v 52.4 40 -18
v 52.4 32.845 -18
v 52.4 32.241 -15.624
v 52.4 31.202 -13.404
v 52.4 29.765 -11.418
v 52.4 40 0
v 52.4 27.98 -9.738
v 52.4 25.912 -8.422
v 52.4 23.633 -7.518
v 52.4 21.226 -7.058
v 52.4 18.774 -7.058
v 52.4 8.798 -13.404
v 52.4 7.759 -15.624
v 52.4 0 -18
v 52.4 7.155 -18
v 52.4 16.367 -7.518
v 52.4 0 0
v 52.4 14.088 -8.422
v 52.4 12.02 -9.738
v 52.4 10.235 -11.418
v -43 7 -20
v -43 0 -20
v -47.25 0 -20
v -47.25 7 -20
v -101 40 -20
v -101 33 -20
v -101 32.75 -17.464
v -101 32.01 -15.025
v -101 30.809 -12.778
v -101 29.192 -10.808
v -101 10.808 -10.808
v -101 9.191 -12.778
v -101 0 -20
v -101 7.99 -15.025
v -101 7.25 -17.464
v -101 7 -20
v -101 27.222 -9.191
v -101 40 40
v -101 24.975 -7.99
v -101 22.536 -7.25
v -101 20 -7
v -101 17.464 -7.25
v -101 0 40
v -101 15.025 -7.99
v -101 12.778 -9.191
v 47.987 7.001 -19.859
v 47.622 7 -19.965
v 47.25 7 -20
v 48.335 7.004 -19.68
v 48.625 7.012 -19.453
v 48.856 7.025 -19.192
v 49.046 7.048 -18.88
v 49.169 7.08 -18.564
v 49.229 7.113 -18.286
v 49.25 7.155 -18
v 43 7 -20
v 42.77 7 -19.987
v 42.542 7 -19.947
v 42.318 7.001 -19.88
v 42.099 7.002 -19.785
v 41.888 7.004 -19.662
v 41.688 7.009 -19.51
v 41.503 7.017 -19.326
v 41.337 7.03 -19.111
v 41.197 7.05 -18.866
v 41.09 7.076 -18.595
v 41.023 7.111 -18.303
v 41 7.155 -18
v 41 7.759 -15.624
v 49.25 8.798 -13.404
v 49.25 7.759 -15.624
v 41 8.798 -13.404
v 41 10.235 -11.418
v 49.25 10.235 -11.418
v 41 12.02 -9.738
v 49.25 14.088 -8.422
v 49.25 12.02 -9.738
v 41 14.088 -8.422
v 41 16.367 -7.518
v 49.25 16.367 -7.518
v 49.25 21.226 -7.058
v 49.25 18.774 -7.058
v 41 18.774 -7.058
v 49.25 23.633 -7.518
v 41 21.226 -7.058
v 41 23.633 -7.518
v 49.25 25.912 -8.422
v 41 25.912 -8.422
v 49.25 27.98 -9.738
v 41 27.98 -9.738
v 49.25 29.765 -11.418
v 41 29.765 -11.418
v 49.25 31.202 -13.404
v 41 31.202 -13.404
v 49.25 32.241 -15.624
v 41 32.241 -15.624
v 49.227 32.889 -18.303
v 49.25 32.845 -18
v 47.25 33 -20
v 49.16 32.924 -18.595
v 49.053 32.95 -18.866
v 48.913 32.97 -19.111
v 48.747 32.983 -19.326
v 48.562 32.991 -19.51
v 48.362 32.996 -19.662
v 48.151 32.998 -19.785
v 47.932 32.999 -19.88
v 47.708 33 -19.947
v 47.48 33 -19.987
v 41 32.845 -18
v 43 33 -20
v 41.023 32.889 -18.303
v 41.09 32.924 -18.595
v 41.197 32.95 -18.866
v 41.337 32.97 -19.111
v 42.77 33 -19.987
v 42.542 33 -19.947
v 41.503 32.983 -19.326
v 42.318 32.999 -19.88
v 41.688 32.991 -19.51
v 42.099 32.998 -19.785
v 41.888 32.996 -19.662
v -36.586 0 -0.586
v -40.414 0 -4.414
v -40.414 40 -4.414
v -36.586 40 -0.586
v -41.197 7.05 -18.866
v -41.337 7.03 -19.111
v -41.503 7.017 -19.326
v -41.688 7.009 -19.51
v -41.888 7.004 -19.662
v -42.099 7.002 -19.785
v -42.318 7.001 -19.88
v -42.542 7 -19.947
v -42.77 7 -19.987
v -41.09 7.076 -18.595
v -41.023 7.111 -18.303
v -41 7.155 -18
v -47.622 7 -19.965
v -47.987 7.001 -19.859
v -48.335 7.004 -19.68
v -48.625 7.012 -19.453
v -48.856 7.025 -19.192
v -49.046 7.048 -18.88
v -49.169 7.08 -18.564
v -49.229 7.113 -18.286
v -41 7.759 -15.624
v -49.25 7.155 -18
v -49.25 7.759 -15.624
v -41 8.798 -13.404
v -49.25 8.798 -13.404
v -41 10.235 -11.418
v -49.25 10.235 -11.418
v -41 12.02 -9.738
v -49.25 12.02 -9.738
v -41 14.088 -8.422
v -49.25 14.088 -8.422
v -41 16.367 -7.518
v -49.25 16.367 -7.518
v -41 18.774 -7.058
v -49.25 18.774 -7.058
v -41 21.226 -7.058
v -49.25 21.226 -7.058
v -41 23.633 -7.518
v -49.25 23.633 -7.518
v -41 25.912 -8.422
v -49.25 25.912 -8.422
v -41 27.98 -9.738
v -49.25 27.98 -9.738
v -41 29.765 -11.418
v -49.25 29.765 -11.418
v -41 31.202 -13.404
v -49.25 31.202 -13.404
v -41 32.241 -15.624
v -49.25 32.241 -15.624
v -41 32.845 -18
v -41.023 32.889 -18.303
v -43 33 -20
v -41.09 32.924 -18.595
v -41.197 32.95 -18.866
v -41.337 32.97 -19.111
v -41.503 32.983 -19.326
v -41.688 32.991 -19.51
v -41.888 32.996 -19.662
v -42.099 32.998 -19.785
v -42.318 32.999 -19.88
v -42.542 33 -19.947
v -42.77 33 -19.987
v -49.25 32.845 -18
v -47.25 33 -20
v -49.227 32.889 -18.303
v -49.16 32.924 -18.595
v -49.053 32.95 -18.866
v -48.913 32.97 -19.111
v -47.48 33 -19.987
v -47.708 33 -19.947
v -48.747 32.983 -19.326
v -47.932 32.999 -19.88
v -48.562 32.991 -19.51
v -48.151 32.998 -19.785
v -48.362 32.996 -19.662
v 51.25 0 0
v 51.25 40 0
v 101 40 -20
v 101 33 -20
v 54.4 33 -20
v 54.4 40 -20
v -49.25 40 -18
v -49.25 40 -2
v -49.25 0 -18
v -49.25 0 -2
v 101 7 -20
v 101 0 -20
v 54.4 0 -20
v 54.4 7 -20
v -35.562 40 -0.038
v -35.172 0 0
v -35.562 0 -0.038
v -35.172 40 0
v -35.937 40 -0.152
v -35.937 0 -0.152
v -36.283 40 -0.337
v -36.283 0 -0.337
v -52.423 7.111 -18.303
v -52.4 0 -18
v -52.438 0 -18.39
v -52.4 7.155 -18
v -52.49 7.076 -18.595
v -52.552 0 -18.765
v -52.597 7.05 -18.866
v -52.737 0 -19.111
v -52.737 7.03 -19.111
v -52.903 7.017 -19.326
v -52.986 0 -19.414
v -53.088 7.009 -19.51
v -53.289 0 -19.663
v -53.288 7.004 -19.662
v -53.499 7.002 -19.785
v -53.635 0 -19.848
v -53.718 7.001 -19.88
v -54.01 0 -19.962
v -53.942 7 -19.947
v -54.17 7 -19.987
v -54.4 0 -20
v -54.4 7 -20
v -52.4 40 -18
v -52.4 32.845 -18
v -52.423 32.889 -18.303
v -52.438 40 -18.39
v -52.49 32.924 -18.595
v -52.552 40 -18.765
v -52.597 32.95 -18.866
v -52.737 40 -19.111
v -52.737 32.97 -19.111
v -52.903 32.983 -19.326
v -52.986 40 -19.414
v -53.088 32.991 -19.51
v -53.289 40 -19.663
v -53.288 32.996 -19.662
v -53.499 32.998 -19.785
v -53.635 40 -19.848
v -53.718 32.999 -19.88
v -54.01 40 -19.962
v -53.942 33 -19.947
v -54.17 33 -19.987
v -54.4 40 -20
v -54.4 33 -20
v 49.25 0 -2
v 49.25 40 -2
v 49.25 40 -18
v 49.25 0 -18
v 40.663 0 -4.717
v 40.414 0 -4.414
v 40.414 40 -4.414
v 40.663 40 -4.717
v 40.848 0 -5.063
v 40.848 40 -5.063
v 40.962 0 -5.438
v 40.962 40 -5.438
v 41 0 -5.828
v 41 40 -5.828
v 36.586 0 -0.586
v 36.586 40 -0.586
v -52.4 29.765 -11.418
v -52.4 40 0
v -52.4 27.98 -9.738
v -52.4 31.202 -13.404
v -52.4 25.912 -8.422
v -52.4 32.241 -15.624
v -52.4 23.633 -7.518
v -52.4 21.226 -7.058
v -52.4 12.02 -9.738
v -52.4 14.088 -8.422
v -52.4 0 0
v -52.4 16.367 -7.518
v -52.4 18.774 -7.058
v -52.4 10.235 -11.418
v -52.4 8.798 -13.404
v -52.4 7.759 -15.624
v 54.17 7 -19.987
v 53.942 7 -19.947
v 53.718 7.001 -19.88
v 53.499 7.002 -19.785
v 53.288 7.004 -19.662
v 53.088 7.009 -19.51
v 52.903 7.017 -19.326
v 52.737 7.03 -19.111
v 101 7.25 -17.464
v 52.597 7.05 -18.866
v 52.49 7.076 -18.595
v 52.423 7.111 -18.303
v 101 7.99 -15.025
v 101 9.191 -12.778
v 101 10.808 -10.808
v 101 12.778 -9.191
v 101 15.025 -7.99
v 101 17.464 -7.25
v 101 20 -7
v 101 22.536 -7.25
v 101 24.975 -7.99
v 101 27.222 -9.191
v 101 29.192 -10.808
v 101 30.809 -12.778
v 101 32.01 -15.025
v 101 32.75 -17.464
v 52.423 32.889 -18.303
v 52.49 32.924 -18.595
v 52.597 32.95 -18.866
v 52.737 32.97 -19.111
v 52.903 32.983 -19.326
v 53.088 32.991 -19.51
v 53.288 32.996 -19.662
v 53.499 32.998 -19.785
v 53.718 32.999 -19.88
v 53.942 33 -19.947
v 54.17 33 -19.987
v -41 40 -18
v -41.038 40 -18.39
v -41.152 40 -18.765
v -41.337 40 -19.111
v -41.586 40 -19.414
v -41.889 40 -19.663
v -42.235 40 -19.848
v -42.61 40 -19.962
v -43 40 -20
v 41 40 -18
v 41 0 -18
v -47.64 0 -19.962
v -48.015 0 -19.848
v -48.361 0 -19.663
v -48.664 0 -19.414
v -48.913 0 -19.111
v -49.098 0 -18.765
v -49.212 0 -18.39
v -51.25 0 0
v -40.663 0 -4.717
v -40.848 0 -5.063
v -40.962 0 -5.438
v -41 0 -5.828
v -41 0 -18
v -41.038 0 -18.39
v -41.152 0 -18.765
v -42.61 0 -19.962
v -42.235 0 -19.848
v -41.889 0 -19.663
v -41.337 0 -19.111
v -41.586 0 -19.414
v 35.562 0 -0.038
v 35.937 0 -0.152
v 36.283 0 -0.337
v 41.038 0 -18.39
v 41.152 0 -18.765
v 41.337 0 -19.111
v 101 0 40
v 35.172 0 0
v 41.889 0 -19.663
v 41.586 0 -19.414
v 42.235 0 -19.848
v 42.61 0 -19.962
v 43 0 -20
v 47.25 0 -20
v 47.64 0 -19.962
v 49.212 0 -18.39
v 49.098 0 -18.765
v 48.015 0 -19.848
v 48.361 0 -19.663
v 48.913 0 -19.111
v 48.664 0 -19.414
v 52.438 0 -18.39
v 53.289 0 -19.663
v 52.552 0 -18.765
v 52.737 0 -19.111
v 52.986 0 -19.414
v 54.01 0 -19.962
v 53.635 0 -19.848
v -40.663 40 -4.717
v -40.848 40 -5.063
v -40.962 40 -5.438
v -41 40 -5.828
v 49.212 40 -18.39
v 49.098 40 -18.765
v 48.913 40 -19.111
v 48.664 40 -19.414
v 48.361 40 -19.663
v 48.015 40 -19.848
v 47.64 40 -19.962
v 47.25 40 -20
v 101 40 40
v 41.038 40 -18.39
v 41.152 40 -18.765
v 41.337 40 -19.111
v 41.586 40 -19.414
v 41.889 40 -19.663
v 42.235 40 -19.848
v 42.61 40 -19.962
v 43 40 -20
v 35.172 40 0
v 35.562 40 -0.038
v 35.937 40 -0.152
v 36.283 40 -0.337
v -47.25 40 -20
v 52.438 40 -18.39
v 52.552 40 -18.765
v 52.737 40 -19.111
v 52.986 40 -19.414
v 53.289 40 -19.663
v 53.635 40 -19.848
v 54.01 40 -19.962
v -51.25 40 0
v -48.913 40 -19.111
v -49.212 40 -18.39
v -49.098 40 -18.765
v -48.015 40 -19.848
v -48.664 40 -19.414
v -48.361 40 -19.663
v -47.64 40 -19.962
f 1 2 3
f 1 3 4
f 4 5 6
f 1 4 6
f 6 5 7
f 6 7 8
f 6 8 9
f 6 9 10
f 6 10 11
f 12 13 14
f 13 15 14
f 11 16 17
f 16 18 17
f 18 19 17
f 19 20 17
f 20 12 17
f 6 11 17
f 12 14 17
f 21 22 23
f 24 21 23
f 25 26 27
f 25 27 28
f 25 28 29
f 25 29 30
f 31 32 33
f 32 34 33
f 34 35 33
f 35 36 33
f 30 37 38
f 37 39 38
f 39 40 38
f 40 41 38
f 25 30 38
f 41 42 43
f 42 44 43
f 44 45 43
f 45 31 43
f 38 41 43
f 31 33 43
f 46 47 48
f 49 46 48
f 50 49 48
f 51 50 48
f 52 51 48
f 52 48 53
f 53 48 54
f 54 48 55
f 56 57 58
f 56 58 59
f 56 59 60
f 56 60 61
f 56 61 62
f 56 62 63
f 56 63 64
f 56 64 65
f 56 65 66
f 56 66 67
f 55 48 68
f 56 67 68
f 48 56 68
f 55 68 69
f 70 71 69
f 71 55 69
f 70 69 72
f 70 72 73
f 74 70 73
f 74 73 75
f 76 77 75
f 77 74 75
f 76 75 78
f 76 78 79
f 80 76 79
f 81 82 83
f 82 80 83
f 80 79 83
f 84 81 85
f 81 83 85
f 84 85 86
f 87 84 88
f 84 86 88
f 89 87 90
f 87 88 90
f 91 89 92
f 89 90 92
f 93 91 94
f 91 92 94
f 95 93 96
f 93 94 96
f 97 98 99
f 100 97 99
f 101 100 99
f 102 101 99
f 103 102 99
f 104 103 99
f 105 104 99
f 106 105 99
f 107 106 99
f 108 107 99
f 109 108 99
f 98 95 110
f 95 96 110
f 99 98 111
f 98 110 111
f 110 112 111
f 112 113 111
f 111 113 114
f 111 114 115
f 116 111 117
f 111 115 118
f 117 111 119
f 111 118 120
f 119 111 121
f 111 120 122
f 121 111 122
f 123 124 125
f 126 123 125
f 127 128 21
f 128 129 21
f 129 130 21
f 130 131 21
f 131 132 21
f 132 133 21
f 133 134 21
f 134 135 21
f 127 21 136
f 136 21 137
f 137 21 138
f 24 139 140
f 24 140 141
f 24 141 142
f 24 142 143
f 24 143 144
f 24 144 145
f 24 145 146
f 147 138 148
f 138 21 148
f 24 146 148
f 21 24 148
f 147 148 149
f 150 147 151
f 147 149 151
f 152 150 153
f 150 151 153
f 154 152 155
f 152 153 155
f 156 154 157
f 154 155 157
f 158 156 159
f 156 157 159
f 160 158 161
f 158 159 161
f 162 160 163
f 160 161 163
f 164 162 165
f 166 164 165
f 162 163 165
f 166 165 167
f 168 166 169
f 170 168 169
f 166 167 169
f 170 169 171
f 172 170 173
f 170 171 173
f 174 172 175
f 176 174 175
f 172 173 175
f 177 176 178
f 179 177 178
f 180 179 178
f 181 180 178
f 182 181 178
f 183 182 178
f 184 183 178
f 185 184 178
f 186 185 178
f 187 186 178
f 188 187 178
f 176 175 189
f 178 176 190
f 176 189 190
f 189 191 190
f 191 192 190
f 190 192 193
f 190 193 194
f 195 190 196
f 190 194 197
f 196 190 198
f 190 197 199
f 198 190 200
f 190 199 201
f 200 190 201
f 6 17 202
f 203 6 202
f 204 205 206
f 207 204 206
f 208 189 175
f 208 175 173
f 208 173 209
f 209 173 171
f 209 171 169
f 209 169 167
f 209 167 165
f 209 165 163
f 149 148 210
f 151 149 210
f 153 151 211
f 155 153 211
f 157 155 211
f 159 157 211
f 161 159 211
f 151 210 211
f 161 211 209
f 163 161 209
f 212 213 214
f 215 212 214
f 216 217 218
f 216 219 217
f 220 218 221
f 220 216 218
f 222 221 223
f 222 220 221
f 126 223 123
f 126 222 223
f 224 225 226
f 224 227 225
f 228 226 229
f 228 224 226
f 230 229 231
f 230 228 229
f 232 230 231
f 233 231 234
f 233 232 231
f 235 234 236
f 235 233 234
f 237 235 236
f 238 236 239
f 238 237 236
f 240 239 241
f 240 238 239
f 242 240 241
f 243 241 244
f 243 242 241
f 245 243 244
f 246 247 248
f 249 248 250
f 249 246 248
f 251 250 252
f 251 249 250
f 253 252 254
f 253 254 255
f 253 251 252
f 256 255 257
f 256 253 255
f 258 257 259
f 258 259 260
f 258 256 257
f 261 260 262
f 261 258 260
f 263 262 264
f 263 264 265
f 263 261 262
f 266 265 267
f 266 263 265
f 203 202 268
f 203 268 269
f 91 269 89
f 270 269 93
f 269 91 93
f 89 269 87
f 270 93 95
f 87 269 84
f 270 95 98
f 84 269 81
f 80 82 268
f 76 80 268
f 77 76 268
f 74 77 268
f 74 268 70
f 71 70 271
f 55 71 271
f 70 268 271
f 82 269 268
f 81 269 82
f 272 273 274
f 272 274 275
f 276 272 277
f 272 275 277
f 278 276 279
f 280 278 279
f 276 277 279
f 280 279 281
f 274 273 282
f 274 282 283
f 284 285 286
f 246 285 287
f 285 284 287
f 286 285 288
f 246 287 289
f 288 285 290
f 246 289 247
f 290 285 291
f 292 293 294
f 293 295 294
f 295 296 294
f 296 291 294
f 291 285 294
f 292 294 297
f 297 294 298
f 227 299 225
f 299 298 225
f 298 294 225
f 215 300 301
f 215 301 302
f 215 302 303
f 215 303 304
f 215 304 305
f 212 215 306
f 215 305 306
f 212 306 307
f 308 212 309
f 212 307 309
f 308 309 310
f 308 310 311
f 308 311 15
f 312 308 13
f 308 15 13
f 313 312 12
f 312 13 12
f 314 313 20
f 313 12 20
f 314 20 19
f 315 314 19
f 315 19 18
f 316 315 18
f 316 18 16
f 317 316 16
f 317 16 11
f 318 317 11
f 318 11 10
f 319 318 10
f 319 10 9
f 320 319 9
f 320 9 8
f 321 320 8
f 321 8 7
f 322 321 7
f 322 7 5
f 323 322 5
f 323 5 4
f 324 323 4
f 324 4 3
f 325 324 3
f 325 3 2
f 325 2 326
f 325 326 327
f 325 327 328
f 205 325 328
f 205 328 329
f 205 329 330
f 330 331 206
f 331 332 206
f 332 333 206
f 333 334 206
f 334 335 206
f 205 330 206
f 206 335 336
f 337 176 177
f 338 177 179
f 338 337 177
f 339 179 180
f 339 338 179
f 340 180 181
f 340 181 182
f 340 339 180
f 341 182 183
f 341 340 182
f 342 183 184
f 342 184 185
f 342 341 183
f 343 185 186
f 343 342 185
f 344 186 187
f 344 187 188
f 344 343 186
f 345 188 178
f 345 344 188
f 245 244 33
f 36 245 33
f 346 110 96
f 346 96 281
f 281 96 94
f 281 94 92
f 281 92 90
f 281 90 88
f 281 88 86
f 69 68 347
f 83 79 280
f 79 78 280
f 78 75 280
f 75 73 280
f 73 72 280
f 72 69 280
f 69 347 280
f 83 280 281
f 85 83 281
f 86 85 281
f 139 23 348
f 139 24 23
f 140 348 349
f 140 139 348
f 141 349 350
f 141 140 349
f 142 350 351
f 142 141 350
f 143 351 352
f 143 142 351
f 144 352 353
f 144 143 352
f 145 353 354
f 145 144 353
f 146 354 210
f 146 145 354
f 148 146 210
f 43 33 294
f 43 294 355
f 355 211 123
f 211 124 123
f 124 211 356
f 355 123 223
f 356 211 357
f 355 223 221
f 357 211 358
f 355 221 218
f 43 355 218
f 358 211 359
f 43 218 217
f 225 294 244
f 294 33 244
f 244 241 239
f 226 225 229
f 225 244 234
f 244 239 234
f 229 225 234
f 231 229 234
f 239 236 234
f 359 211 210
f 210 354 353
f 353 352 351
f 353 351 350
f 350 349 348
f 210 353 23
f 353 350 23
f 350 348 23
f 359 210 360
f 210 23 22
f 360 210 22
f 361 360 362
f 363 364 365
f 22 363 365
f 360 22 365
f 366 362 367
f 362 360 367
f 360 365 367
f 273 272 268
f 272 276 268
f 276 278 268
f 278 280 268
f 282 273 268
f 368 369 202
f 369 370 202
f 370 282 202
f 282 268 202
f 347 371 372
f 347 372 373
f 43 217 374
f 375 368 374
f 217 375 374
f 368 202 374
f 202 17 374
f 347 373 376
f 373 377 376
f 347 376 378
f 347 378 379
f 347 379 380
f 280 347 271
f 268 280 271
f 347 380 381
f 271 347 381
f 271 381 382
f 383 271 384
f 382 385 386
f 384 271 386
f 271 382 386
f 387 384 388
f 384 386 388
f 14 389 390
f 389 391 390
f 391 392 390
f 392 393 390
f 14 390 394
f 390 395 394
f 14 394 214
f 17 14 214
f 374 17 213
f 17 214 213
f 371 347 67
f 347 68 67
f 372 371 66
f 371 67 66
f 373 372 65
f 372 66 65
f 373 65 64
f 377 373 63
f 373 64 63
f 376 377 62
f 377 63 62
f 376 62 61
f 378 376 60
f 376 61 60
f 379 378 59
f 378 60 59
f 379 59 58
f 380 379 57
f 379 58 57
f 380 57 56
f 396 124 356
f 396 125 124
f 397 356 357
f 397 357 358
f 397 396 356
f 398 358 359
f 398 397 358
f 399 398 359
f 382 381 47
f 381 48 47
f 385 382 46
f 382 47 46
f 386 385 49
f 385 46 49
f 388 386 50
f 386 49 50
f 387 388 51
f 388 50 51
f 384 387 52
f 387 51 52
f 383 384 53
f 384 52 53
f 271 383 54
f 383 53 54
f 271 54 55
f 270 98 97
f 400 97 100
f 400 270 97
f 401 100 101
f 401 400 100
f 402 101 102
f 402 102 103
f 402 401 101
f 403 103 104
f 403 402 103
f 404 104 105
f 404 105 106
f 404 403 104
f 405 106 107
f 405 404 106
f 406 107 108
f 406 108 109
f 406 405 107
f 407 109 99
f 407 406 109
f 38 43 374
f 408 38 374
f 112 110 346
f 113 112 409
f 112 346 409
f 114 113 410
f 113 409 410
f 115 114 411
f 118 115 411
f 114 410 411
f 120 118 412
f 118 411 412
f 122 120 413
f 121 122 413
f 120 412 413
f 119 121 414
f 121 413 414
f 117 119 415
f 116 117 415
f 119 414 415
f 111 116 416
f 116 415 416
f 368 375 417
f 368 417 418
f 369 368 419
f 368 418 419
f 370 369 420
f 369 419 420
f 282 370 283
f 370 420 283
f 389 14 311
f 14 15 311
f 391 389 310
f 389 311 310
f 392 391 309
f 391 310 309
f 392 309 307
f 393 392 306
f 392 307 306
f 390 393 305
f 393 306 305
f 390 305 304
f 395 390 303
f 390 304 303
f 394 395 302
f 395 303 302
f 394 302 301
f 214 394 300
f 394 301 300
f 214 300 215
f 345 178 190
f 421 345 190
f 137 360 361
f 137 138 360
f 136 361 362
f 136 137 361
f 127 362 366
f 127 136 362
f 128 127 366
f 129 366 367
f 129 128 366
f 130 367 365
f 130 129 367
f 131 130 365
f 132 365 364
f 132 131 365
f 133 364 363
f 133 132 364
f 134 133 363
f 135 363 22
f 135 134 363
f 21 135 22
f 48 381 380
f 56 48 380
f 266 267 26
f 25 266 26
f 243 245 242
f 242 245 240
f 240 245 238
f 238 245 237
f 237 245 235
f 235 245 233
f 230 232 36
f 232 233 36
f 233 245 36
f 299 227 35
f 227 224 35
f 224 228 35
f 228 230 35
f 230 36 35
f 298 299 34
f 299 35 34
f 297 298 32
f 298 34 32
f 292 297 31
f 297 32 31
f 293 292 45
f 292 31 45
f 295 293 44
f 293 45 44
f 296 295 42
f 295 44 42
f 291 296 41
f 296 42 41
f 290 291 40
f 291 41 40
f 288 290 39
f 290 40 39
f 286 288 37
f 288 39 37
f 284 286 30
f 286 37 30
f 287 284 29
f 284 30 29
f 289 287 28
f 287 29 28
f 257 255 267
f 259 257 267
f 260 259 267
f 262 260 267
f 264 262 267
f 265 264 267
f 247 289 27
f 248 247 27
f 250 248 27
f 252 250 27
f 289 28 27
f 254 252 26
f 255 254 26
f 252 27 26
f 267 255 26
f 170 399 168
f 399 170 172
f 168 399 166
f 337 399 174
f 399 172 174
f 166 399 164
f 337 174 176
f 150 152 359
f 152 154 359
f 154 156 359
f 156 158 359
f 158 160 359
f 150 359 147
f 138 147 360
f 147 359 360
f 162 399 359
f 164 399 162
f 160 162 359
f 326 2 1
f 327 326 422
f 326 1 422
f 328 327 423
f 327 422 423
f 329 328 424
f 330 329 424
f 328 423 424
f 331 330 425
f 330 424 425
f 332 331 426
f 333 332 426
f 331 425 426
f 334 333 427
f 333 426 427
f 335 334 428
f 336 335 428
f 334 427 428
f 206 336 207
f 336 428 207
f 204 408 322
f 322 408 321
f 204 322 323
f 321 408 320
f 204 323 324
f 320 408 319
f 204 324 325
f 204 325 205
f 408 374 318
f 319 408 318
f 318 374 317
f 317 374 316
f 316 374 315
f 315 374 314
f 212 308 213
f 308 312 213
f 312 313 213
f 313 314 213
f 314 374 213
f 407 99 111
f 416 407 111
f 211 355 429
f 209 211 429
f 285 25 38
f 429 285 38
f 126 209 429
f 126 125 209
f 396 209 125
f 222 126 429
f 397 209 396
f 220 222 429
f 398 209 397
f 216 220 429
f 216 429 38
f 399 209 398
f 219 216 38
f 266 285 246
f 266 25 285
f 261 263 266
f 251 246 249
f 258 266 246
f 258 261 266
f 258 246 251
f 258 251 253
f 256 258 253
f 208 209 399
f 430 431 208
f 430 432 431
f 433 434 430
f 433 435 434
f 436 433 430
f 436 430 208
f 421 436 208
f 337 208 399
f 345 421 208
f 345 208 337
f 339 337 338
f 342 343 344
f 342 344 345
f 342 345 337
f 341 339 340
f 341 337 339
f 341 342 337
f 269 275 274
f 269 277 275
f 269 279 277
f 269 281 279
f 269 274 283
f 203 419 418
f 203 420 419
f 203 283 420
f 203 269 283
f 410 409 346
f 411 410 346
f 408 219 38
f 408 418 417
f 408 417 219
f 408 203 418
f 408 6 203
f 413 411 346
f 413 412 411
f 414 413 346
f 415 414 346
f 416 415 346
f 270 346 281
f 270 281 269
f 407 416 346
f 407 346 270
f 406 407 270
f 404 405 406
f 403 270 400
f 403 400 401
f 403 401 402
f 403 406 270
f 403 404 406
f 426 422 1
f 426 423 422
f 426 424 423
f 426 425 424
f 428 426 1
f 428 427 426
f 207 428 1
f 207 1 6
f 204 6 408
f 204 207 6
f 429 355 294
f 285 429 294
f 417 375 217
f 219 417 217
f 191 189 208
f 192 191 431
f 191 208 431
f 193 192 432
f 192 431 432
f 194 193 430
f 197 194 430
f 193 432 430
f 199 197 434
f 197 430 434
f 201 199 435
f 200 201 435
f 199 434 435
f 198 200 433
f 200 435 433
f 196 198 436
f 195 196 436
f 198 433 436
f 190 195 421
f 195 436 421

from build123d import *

# Parameters (mm, degrees)
BOSS_EXTRUDE1_DEPTH = 40
SKETCH2_R           = 13
CUT_EXTRUDE1_DEPTH  = 210.771304043
CHAMFER1_SIZE       = 5
FILLET3_R           = 2
CHAMFER2_SIZE       = 2


with BuildPart() as part:
    # Sketch1 → Boss-Extrude1 (new body)
    with BuildSketch(Plane(origin=(0, 0, 0), x_dir=(1, 0, 0), z_dir=(0, 1, 0))):
        Polygon((41, 0), (-41, 0), (-41, 20), (-49.25, 20), (-49.25, 0), (-52.4, 0), (-52.4, 20), (-101, 20), (-101, -40), (101, -40), (101, 20), (52.4, 20), (52.4, 0), (49.25, 0), (49.25, 20), (41, 20), align=None)
    extrude(amount=BOSS_EXTRUDE1_DEPTH)

    # Sketch2 → Cut-Extrude1 (cut, through all)
    with BuildSketch(Plane.ZY.offset(101)):
        with Locations((-20, 20)):
            Circle(SKETCH2_R)
    extrude(amount=-CUT_EXTRUDE1_DEPTH, mode=Mode.SUBTRACT)

    # Chamfer1
    chamfer1_edges = [part.edges().sort_by_distance(p)[0] for p in [
        (-41, 20, 0),
        (41, 20, 0),
    ]]
    chamfer(chamfer1_edges, length=CHAMFER1_SIZE)

    # Fillet3
    fillet3_edges = [part.edges().sort_by_distance(p)[0] for p in [
        (41, 36.5, -20),
        (49.25, 36.5, -20),
        (52.4, 36.5, -20),
        (-52.4, 36.5, -20),
        (-49.25, 36.5, -20),
        (-41, 36.5, -20),
        (41, 3.5, -20),
        (49.25, 3.5, -20),
        (52.4, 3.5, -20),
        (-52.4, 3.5, -20),
        (-49.25, 3.5, -20),
        (-41, 3.5, -20),
        (-36, 20, 0),
        (36, 20, 0),
        (41, 20, -5),
        (-41, 20, -5),
    ]]
    fillet(fillet3_edges, radius=FILLET3_R)

    # Chamfer2
    chamfer2_edges = [part.edges().sort_by_distance(p)[0] for p in [
        (49.25, 20, 0),
        (-49.25, 20, 0),
    ]]
    chamfer(chamfer2_edges, length=CHAMFER2_SIZE)


solid = part.part
